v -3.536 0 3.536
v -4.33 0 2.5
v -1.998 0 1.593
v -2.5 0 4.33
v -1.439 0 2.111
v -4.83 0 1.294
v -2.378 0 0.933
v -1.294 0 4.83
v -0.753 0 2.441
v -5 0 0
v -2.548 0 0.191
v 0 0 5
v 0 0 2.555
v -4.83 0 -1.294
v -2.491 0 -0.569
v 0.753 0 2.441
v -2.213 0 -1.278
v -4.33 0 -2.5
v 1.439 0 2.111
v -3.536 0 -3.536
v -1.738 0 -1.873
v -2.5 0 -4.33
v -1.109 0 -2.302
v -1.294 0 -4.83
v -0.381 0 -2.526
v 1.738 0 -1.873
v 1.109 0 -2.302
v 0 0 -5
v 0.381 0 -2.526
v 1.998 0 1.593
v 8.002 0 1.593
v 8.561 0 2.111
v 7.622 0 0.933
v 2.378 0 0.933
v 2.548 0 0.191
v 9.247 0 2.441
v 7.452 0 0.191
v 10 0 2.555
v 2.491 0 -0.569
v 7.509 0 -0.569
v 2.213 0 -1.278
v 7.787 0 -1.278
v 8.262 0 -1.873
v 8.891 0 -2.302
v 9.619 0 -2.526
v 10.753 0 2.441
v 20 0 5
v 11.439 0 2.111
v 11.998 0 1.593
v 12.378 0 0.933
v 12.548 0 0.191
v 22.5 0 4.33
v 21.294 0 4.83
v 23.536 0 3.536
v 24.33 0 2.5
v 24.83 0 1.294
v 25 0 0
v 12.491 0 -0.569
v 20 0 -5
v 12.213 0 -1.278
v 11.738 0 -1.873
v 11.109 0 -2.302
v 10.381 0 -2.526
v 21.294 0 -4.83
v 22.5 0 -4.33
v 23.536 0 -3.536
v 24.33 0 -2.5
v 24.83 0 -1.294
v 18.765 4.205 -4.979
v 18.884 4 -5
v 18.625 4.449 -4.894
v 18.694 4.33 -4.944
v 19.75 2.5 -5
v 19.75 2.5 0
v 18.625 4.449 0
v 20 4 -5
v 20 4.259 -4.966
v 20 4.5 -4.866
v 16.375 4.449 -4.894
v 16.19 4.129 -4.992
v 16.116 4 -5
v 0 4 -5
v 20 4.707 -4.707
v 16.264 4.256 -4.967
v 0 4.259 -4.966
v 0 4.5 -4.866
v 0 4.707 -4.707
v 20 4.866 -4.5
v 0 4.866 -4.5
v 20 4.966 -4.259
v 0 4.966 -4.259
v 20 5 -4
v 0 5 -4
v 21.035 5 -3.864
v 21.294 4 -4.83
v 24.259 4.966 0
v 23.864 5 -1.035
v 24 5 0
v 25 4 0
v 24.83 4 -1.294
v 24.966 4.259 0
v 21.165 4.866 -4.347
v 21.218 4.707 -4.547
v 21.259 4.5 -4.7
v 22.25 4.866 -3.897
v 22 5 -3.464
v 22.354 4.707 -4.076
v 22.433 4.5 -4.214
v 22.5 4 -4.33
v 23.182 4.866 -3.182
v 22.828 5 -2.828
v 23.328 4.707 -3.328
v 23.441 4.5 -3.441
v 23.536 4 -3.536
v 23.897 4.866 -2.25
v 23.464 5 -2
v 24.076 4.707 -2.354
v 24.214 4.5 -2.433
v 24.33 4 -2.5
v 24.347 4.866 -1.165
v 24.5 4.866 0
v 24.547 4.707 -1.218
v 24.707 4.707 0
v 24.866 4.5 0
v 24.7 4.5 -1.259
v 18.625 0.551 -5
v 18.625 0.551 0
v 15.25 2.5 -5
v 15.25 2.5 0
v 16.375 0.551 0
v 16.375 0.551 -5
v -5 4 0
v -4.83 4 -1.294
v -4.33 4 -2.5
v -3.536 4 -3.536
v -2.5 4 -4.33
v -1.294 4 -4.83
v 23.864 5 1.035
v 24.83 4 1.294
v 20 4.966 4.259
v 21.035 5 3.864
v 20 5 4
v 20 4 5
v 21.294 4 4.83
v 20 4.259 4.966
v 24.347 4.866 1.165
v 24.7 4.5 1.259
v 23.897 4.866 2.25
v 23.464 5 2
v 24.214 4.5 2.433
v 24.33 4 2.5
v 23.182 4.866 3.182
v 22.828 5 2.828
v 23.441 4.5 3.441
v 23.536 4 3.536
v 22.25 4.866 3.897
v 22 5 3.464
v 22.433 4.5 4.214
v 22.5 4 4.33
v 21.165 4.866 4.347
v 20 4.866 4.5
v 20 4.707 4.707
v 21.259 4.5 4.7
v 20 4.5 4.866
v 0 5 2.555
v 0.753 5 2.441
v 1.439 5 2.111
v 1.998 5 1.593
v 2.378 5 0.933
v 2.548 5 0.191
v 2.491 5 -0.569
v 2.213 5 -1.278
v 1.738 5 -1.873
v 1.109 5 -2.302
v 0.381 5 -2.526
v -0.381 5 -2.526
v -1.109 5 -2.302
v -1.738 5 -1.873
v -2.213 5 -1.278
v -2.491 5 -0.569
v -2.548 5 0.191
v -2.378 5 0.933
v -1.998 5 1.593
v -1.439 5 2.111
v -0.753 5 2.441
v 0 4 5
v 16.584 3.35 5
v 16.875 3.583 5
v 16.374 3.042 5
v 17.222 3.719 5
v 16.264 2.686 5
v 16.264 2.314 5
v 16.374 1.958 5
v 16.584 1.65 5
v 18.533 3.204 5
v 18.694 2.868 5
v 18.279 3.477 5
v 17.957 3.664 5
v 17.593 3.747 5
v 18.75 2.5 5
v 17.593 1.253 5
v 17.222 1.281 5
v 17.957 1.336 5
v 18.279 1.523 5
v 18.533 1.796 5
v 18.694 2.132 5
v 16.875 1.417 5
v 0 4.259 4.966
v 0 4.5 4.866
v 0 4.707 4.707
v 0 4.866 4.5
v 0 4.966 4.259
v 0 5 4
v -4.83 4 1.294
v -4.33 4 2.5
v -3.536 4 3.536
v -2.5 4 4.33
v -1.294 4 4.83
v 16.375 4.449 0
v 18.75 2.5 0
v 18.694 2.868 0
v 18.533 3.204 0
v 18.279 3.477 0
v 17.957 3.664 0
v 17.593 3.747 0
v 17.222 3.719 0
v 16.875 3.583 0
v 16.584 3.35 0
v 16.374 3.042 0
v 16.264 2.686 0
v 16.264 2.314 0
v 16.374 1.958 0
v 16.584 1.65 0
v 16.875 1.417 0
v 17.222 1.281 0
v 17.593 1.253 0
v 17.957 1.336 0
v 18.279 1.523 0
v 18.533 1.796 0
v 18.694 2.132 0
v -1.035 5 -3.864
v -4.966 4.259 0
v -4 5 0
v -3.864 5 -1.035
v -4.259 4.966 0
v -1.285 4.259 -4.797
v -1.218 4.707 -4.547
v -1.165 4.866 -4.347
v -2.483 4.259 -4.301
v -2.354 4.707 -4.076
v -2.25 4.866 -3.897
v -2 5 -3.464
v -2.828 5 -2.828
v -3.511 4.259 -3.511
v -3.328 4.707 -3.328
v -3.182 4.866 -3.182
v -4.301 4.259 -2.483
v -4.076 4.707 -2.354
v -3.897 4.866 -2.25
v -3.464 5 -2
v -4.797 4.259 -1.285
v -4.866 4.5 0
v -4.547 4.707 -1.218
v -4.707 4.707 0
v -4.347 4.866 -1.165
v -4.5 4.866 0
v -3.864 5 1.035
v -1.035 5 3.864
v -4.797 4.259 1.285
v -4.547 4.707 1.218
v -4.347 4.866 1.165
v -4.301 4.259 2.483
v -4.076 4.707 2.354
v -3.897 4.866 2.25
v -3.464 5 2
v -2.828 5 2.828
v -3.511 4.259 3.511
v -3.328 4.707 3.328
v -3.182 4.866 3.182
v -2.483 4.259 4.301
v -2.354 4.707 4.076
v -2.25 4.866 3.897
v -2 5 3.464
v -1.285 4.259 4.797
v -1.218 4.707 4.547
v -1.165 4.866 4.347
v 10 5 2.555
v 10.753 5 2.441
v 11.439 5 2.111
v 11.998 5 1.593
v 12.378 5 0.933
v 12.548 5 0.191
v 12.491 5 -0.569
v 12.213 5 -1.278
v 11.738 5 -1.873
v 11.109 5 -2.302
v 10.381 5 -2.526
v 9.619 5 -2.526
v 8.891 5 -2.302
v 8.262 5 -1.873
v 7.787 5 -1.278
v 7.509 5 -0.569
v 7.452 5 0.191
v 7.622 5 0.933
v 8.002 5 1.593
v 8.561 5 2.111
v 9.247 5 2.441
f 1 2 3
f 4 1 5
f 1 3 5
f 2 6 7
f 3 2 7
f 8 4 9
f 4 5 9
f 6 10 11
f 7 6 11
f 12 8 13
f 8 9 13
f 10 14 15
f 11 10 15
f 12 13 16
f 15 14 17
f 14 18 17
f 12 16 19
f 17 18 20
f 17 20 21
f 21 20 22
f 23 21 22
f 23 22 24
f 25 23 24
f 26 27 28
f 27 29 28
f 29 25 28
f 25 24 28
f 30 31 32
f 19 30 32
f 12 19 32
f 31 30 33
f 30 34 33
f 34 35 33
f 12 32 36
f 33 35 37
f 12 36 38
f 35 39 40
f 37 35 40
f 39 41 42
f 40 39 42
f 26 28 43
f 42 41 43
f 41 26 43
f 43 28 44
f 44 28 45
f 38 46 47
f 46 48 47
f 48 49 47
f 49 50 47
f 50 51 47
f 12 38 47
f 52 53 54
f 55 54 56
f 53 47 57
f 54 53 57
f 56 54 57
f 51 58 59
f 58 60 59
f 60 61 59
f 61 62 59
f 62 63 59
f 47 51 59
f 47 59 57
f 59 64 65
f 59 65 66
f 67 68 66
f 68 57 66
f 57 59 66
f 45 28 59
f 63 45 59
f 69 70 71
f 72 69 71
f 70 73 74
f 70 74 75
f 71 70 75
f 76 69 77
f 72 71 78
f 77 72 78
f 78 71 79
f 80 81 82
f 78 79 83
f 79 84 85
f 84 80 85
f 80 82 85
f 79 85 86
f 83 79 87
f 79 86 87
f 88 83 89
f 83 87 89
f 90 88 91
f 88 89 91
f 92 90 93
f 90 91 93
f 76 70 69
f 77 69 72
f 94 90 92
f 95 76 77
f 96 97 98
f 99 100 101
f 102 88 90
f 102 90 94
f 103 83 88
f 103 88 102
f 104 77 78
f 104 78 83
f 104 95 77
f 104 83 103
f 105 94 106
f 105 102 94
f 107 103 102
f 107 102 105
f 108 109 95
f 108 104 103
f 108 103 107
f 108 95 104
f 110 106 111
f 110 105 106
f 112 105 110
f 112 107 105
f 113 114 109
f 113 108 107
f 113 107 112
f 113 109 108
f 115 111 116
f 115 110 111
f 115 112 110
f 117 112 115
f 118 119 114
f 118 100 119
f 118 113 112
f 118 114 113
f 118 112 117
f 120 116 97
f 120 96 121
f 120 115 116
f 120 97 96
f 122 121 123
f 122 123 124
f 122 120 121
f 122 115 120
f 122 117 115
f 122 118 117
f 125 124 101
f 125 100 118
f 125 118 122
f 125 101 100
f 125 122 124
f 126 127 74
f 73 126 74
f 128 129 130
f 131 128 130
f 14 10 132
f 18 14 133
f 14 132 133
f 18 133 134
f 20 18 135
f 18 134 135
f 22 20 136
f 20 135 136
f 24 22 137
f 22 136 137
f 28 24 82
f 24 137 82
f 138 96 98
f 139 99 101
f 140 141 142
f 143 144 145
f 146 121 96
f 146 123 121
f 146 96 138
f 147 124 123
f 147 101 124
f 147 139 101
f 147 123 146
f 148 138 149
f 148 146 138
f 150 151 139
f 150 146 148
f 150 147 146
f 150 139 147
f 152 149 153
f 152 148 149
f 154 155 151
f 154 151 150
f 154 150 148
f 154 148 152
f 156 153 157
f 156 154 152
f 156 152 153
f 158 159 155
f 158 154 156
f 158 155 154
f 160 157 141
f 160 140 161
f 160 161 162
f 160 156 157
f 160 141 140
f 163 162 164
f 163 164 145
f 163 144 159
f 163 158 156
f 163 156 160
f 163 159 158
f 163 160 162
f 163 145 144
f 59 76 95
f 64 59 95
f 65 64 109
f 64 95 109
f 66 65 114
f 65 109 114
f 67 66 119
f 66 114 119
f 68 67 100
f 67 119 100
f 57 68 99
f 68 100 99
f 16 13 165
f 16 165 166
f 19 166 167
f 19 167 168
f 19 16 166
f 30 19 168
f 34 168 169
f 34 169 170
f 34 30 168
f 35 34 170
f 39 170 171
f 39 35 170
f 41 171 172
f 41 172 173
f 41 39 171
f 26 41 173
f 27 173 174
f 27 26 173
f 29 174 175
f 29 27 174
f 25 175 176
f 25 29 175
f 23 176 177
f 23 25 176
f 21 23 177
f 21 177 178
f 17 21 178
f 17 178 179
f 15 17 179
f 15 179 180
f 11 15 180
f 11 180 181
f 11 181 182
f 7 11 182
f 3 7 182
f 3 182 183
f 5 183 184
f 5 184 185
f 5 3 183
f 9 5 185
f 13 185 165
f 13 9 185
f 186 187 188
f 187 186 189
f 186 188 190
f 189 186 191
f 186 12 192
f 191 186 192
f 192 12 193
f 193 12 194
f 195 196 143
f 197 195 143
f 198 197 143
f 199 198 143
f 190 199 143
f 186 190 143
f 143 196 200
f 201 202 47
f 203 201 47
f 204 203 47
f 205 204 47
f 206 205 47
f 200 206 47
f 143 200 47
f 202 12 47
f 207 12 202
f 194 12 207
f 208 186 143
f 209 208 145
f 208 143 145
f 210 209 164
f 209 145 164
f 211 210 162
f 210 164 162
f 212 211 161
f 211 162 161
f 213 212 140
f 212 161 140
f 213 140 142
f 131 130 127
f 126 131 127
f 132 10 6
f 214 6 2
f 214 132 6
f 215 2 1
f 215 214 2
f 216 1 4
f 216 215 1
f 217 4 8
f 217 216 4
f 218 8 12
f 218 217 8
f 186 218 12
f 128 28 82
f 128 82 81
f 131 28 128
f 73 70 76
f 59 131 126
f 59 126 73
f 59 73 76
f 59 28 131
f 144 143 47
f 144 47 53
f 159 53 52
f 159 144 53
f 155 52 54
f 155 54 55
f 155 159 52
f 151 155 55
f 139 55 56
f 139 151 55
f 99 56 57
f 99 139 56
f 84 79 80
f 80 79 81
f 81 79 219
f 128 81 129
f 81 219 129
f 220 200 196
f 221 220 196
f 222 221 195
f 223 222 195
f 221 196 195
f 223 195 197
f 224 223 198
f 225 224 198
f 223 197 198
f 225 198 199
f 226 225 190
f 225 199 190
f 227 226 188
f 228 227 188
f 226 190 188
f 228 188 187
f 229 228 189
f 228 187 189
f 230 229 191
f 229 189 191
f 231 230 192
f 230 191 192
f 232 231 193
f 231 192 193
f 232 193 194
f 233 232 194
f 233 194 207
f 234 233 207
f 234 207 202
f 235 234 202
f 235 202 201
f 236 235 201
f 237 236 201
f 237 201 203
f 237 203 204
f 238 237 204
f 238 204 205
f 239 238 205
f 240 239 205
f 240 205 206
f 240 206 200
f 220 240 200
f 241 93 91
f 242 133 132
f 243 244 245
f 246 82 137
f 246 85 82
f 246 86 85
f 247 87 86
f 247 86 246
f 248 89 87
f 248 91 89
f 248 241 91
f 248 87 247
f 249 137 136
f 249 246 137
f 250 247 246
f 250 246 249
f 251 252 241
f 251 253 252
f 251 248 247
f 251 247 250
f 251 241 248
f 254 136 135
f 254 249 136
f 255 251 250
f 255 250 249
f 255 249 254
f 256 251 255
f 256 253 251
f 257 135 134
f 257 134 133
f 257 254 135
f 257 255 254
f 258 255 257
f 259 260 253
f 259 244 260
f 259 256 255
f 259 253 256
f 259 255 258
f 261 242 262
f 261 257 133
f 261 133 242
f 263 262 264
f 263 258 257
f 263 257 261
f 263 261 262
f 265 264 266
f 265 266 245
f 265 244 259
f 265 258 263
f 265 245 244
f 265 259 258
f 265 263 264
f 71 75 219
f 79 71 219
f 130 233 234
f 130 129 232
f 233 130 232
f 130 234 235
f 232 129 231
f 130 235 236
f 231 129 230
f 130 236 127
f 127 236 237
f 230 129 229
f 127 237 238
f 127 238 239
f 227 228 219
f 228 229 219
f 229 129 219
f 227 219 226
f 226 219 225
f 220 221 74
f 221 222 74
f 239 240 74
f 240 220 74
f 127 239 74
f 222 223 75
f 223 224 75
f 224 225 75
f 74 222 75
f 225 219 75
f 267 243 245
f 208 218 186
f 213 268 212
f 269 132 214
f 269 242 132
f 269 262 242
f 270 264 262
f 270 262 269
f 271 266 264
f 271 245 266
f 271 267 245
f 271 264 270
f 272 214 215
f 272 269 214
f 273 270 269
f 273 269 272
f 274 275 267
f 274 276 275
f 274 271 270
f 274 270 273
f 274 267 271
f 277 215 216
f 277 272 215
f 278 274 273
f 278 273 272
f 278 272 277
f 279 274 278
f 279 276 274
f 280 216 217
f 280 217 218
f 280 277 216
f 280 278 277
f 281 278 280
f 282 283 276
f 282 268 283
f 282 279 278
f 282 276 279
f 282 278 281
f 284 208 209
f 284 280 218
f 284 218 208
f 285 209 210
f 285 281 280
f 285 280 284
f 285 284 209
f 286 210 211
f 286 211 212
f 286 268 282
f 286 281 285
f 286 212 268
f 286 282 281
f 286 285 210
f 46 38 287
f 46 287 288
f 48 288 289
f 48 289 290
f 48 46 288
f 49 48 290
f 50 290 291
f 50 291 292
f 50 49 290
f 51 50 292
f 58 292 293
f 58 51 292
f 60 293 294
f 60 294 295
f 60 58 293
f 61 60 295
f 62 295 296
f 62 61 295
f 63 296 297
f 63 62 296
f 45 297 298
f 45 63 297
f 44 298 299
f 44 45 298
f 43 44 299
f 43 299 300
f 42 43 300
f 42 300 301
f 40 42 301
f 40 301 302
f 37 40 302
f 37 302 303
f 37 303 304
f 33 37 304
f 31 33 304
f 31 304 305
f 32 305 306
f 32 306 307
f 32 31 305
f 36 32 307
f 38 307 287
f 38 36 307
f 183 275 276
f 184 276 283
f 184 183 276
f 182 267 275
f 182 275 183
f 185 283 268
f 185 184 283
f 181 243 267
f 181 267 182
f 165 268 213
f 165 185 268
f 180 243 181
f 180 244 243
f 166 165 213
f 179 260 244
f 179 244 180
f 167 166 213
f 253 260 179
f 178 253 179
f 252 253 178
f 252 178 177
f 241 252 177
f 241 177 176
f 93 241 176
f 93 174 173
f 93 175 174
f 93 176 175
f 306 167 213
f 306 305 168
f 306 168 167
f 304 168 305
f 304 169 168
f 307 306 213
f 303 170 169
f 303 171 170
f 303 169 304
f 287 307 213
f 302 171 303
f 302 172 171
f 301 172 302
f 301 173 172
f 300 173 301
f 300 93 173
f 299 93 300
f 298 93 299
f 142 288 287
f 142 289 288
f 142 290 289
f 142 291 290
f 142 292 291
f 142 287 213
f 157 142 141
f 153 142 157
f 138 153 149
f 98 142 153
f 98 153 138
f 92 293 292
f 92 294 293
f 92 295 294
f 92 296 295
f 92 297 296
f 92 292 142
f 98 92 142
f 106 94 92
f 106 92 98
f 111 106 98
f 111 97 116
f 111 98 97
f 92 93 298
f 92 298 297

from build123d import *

# Parameters (mm, degrees)
SKETCH1_W           = 30
SKETCH1_H           = 10
SKETCH1_R           = 2.555
BOSS_EXTRUDE1_DEPTH = 5
SKETCH2_R           = 1.25
CUT_EXTRUDE1_DEPTH  = 28.386127875
CUT_EXTRUDE2_START  = -5
SKETCH2_3_R         = 1.25
CUT_EXTRUDE2_DEPTH  = 5
FILLET1_R           = 5
FILLET2_R           = 1


# Some blends are built 0.0001 mm under size
with BuildPart() as part:
    # Sketch1 → Boss-Extrude1 (new body)
    with BuildSketch(Plane(origin=(0, 0, 0), x_dir=(1, 0, 0), z_dir=(0, 1, 0))):
        with Locations((10, 0)):
            Rectangle(SKETCH1_W, SKETCH1_H)
        with Locations(Location((0, 0, 0), (0, 0, 270))):
            Circle(SKETCH1_R, mode=Mode.SUBTRACT)
        with Locations(Location((10, 0, 0), (0, 0, 270))):
            Circle(SKETCH1_R, mode=Mode.SUBTRACT)
    extrude(amount=BOSS_EXTRUDE1_DEPTH)

    # Sketch2 → Cut-Extrude1 (cut, through all)
    with BuildSketch(Plane.XY.offset(5)):
        with Locations((17.5, 2.5)):
            Circle(SKETCH2_R)
    extrude(amount=-CUT_EXTRUDE1_DEPTH, mode=Mode.SUBTRACT)

    # Sketch2<3> → Cut-Extrude2 (cut)
    with BuildSketch(Plane.XY.offset(5).offset(CUT_EXTRUDE2_START)):
        Polygon((18.625, 4.448557159), (16.375, 4.448557159), (15.25, 2.5), (16.375, 0.551442841), (18.625, 0.551442841), (19.75, 2.5), align=None)
        with Locations((17.5, 2.5)):
            Circle(SKETCH2_3_R, mode=Mode.SUBTRACT)
    extrude(amount=-CUT_EXTRUDE2_DEPTH, mode=Mode.SUBTRACT)

    # Fillet1
    fillet1_edges = [part.edges().sort_by_distance(p)[0] for p in [
        (-5, 2.5, -5),
        (-5, 2.5, 5),
        (25, 2.5, -5),
        (25, 2.5, 5),
    ]]
    fillet(fillet1_edges, radius=FILLET1_R - 0.0001)  # a hair under: the kernel refuses the full size

    # Fillet2
    # the kernel refuses this fillet: 1 mm, written as the material it takes off along each edge
    with BuildSketch(Plane(origin=(-0.0001, 5, 0.0001), x_dir=(-1, 0, 0), z_dir=(0, 0, -1))) as fillet2_piece_1:
        with BuildLine():
            CenterArc((4.9999 - FILLET2_R, -FILLET2_R), FILLET2_R, 0, 90)
            Line((4.9999, -FILLET2_R), (4.9999, 0))
            Line((4.9999, 0), (4.9999 - FILLET2_R, 0))
        make_face()
    revolve(axis=Axis((-0.0001, 5, 0.0001), (0, 1, 0)), revolution_arc=90, mode=Mode.SUBTRACT)
    with BuildSketch(Plane(origin=(-0.0001, 5, -0.0001), x_dir=(0, 0, -1), z_dir=(1, 0, 0))) as fillet2_piece_2:
        with BuildLine():
            CenterArc((4.9999 - FILLET2_R, -FILLET2_R), FILLET2_R, 0, 90)
            Line((4.9999 - FILLET2_R, 0), (4.9999, 0))
            Line((4.9999, 0), (4.9999, -FILLET2_R))
        make_face()
    revolve(axis=Axis((-0.0001, 5, -0.0001), (0, 1, 0)), revolution_arc=90, mode=Mode.SUBTRACT)
    with BuildSketch(Plane(origin=(-0.0001, 5, -5), x_dir=(0, -1, 0), z_dir=(1, 0, 0))) as fillet2_piece_3:
        with BuildLine():
            CenterArc((FILLET2_R, -FILLET2_R), FILLET2_R, 90, 90)
            Line((0, -FILLET2_R), (0, 0))
            Line((0, 0), (FILLET2_R, 0))
        make_face()
    extrude(amount=20.0002, mode=Mode.SUBTRACT)
    with BuildSketch(Plane(origin=(20.0001, 5, -0.0001), x_dir=(0, 0, -1), z_dir=(-1, 0, 0))) as fillet2_piece_4:
        with BuildLine():
            CenterArc((4.9999 - FILLET2_R, FILLET2_R), FILLET2_R, 270, 90)
            Line((4.9999 - FILLET2_R, 0), (4.9999, 0))
            Line((4.9999, 0), (4.9999, FILLET2_R))
        make_face()
    revolve(axis=Axis((20.0001, 5, -0.0001), (0, -1, 0)), revolution_arc=90, mode=Mode.SUBTRACT)
    with BuildSketch(Plane(origin=(20.0001, 5, 0.0001), x_dir=(1, 0, 0), z_dir=(0, 0, -1))) as fillet2_piece_5:
        with BuildLine():
            CenterArc((4.9999 - FILLET2_R, FILLET2_R), FILLET2_R, 270, 90)
            Line((4.9999, FILLET2_R), (4.9999, 0))
            Line((4.9999, 0), (4.9999 - FILLET2_R, 0))
        make_face()
    revolve(axis=Axis((20.0001, 5, 0.0001), (0, -1, 0)), revolution_arc=90, mode=Mode.SUBTRACT)
    with BuildSketch(Plane(origin=(20.0001, 5, 5), x_dir=(0, 0, -1), z_dir=(-1, 0, 0))) as fillet2_piece_6:
        with BuildLine():
            CenterArc((FILLET2_R, FILLET2_R), FILLET2_R, 180, 90)
            Line((0, FILLET2_R), (0, 0))
            Line((0, 0), (FILLET2_R, 0))
        make_face()
    extrude(amount=20.0002, mode=Mode.SUBTRACT)
    with BuildSketch(Plane(origin=(25, 5, -0.0001), x_dir=(-1, 0, 0), z_dir=(0, 0, 1)), Plane(origin=(-5, 5, 0.0001), x_dir=(1, 0, 0), z_dir=(0, 0, -1))) as fillet2_piece_7:
        with BuildLine():
            CenterArc((FILLET2_R, FILLET2_R), FILLET2_R, 180, 90)
            Line((0, FILLET2_R), (0, 0))
            Line((0, 0), (FILLET2_R, 0))
        make_face()
    extrude(amount=0.0002, mode=Mode.SUBTRACT)


solid = part.part
